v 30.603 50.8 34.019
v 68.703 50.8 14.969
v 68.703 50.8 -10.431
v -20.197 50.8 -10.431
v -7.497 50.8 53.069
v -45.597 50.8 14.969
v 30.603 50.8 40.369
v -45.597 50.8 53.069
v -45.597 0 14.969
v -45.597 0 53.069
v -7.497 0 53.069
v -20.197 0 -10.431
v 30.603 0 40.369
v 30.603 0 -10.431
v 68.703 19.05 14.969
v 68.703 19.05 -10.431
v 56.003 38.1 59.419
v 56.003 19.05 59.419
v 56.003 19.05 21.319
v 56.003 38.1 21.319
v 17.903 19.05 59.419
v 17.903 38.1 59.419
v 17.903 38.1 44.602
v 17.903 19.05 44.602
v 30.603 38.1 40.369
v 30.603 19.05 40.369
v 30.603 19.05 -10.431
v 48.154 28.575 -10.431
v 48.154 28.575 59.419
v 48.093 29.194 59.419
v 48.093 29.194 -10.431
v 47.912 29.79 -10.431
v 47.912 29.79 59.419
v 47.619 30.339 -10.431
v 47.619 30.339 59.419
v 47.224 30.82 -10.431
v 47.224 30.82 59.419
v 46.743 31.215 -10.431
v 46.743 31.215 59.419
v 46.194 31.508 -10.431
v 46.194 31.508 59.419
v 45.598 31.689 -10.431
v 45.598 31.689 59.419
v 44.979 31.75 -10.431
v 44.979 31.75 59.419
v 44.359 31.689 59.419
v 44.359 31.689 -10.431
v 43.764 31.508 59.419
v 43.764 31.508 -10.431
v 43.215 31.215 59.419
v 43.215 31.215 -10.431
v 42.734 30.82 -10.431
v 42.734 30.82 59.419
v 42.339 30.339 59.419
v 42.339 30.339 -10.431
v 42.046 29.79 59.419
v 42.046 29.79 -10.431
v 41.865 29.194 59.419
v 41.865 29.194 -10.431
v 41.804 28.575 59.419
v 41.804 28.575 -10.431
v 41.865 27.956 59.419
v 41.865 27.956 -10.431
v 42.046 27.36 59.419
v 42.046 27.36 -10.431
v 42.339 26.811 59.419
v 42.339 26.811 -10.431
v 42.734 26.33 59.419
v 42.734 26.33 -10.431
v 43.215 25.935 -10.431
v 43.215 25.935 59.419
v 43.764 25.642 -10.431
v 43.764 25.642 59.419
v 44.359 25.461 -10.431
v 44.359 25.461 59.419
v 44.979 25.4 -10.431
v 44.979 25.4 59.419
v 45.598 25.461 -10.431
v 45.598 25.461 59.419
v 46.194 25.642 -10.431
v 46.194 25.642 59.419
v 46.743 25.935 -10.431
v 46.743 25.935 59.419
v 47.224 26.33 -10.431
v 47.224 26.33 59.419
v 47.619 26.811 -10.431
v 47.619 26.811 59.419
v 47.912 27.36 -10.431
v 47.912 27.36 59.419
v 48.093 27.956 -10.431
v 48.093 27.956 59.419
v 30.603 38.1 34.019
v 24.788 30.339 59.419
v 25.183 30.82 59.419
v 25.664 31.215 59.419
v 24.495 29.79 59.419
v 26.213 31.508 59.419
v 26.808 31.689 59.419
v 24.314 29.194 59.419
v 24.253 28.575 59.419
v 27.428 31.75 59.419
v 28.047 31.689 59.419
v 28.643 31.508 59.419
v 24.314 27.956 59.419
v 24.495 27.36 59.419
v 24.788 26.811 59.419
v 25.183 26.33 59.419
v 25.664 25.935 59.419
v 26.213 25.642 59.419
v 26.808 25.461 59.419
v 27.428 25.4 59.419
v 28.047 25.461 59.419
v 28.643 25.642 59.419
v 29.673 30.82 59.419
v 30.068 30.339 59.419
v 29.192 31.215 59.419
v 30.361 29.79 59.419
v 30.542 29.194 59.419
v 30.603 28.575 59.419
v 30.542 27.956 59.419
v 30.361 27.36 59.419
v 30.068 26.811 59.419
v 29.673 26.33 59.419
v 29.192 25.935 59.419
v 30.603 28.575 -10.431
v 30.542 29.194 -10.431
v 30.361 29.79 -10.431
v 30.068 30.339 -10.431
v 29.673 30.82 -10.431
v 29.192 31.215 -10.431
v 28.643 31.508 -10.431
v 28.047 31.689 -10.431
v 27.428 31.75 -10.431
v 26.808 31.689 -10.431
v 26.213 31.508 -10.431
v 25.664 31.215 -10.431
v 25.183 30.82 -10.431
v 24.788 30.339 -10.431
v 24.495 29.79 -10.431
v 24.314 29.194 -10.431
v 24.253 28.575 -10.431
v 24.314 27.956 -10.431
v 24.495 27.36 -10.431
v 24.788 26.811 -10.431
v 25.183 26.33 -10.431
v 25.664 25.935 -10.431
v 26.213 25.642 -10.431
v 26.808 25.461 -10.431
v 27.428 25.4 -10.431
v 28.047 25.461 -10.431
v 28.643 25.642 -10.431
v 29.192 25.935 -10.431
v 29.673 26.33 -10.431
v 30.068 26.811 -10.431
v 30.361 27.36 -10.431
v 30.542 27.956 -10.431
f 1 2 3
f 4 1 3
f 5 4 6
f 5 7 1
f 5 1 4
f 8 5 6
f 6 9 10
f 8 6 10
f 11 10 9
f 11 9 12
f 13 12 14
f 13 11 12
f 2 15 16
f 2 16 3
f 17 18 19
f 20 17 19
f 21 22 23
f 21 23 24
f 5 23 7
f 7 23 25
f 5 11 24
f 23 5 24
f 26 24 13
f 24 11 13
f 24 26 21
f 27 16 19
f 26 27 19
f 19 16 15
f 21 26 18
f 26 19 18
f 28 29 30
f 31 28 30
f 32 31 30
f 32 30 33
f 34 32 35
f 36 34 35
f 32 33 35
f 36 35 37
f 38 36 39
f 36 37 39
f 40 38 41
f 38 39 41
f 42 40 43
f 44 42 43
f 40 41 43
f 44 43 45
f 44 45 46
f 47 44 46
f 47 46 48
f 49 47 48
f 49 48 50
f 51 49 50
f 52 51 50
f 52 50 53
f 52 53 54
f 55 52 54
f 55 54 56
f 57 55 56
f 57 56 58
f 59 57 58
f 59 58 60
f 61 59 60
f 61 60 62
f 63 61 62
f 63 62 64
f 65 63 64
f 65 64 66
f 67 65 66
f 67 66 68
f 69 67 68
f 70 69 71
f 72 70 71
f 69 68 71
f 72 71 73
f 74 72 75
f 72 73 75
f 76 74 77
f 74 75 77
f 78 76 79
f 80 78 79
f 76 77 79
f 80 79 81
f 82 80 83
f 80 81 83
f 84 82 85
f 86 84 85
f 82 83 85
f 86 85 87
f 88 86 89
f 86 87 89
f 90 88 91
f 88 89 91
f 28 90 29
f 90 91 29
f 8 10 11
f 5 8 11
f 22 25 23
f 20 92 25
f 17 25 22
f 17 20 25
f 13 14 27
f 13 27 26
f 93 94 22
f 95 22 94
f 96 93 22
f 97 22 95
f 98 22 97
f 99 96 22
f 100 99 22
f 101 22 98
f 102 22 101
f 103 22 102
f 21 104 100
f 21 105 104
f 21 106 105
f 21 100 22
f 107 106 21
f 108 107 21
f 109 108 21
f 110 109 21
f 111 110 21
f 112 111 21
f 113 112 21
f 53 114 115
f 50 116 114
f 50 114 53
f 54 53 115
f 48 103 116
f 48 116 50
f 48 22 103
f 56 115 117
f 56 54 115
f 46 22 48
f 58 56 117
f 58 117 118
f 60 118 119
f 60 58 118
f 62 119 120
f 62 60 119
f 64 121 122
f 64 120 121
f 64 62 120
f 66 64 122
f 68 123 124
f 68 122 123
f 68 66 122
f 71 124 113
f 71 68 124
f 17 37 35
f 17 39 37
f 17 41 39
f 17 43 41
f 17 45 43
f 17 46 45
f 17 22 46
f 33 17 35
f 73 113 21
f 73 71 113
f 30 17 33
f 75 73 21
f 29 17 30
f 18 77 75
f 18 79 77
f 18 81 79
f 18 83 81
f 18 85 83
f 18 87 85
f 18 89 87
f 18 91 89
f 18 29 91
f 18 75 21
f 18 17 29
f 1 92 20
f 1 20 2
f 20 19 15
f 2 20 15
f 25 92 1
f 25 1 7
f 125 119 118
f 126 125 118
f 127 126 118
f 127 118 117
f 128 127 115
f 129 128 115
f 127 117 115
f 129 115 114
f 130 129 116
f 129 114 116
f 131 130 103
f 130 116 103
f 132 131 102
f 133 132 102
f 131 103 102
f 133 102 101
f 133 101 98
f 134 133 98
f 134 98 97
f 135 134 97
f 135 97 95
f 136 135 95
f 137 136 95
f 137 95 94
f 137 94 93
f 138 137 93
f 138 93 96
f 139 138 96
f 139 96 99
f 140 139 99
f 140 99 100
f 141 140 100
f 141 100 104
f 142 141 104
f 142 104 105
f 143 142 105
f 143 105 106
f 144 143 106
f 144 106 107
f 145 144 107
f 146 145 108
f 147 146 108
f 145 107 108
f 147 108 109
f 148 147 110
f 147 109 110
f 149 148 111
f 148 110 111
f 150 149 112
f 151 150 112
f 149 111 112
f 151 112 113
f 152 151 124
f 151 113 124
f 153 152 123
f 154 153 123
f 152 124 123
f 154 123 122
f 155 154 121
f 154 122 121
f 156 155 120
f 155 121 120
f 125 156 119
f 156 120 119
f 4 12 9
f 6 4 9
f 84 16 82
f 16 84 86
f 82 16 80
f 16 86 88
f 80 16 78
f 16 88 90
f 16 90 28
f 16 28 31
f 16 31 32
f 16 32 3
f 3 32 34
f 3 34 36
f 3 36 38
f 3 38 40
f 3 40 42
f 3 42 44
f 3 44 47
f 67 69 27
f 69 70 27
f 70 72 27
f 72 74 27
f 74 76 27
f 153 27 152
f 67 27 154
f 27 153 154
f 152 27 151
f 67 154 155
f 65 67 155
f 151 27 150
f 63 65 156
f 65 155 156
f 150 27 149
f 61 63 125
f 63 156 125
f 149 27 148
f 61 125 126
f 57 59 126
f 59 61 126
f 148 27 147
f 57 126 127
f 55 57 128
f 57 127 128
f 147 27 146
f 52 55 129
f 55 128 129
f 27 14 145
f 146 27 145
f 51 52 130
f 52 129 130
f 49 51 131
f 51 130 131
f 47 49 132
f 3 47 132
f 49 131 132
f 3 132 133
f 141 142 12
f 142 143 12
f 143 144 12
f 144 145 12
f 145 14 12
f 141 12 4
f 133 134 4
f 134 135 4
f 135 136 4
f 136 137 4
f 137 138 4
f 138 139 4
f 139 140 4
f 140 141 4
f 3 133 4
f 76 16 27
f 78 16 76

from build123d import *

# Parameters (mm, degrees)
F0_W      = 76.2
F0_H      = 63.5
F1_DEPTH  = 50.8
F3_DEPTH  = 50.8
F4_W      = 19.05
F4_H      = 44.45
F5_DEPTH  = 38.1
F6_W      = 19.05
F6_H      = 19.05
F7_DEPTH  = 12.7
F10_DEPTH = 12.7
F11_R     = 3.175
F12_DEPTH = 69.851
F13_DEPTH = 31.75


with BuildPart() as f1:
    # F0 (on Front) → F1 (new body)
    with BuildSketch(Plane.XZ):
        with Locations((-7.4970987678, 21.3185883239)):
            Rectangle(F0_W, F0_H)
    extrude(amount=-F1_DEPTH)

    # F2 (on face) → F3 (cut)
    with BuildSketch(Plane.XZ):
        Polygon((-45.5970987678, 14.9685883239), (-45.5970987678, -10.4314116761), (-20.1970987678, -10.4314116761), align=None)
        Polygon((30.6029012322, 40.3685883239), (30.6029012322, 53.0685883239), (-7.4970987678, 53.0685883239), align=None)
    extrude(amount=-F3_DEPTH, mode=Mode.SUBTRACT)

    # F4 (on face) → F5 (join)
    with BuildSketch(Plane.YZ.offset(30.6029012322)):
        Polygon((19.05, 14.9685883239), (19.05, -10.4314116761), (50.8, -10.4314116761), (50.8, 14.9685883239), (38.1, 14.9685883239), align=None)
        with Locations((28.575, 37.1935883239)):
            Rectangle(F4_W, F4_H)
    extrude(amount=F5_DEPTH)

    # F6 (on face) → F7 (join)
    with BuildSketch(Plane(origin=(30.6029012322, 0, 0), x_dir=(0, -1, 0), z_dir=(-1, 0, 0))):
        with Locations((-28.575, 49.8935883239)):
            Rectangle(F6_W, F6_H)
    extrude(amount=F7_DEPTH)

    # F9 (on face) → F10 (join)
    with BuildSketch(Plane(origin=(0, 38.1, 0), x_dir=(-1, 0, 0), z_dir=(0, 1, 0))):
        Polygon((-30.6029012322, 34.0185883239), (-68.7029012322, 14.9685883239), (-30.6029012322, 14.9685883239), align=None)
    extrude(amount=F10_DEPTH)

    # F11 (on face) → F12 (cut, through all)
    with BuildSketch(Plane.XY.offset(59.4185883239)):
        with Locations((27.4279012322, 28.575)):
            Circle(F11_R)
        with Locations((44.9788695751, 28.575)):
            Circle(F11_R)
    extrude(amount=-F12_DEPTH, mode=Mode.SUBTRACT)

    # F8 (on face) → F13 (cut)
    with BuildSketch(Plane.XZ.offset(-19.05)):
        Polygon((56.0029012322, 59.4185883239), (56.0029012322, 21.3185883239), (68.7029012322, 14.9685883239), (68.7029012322, 59.4185883239), align=None)
    extrude(amount=-F13_DEPTH, mode=Mode.SUBTRACT)


solid = f1.part
